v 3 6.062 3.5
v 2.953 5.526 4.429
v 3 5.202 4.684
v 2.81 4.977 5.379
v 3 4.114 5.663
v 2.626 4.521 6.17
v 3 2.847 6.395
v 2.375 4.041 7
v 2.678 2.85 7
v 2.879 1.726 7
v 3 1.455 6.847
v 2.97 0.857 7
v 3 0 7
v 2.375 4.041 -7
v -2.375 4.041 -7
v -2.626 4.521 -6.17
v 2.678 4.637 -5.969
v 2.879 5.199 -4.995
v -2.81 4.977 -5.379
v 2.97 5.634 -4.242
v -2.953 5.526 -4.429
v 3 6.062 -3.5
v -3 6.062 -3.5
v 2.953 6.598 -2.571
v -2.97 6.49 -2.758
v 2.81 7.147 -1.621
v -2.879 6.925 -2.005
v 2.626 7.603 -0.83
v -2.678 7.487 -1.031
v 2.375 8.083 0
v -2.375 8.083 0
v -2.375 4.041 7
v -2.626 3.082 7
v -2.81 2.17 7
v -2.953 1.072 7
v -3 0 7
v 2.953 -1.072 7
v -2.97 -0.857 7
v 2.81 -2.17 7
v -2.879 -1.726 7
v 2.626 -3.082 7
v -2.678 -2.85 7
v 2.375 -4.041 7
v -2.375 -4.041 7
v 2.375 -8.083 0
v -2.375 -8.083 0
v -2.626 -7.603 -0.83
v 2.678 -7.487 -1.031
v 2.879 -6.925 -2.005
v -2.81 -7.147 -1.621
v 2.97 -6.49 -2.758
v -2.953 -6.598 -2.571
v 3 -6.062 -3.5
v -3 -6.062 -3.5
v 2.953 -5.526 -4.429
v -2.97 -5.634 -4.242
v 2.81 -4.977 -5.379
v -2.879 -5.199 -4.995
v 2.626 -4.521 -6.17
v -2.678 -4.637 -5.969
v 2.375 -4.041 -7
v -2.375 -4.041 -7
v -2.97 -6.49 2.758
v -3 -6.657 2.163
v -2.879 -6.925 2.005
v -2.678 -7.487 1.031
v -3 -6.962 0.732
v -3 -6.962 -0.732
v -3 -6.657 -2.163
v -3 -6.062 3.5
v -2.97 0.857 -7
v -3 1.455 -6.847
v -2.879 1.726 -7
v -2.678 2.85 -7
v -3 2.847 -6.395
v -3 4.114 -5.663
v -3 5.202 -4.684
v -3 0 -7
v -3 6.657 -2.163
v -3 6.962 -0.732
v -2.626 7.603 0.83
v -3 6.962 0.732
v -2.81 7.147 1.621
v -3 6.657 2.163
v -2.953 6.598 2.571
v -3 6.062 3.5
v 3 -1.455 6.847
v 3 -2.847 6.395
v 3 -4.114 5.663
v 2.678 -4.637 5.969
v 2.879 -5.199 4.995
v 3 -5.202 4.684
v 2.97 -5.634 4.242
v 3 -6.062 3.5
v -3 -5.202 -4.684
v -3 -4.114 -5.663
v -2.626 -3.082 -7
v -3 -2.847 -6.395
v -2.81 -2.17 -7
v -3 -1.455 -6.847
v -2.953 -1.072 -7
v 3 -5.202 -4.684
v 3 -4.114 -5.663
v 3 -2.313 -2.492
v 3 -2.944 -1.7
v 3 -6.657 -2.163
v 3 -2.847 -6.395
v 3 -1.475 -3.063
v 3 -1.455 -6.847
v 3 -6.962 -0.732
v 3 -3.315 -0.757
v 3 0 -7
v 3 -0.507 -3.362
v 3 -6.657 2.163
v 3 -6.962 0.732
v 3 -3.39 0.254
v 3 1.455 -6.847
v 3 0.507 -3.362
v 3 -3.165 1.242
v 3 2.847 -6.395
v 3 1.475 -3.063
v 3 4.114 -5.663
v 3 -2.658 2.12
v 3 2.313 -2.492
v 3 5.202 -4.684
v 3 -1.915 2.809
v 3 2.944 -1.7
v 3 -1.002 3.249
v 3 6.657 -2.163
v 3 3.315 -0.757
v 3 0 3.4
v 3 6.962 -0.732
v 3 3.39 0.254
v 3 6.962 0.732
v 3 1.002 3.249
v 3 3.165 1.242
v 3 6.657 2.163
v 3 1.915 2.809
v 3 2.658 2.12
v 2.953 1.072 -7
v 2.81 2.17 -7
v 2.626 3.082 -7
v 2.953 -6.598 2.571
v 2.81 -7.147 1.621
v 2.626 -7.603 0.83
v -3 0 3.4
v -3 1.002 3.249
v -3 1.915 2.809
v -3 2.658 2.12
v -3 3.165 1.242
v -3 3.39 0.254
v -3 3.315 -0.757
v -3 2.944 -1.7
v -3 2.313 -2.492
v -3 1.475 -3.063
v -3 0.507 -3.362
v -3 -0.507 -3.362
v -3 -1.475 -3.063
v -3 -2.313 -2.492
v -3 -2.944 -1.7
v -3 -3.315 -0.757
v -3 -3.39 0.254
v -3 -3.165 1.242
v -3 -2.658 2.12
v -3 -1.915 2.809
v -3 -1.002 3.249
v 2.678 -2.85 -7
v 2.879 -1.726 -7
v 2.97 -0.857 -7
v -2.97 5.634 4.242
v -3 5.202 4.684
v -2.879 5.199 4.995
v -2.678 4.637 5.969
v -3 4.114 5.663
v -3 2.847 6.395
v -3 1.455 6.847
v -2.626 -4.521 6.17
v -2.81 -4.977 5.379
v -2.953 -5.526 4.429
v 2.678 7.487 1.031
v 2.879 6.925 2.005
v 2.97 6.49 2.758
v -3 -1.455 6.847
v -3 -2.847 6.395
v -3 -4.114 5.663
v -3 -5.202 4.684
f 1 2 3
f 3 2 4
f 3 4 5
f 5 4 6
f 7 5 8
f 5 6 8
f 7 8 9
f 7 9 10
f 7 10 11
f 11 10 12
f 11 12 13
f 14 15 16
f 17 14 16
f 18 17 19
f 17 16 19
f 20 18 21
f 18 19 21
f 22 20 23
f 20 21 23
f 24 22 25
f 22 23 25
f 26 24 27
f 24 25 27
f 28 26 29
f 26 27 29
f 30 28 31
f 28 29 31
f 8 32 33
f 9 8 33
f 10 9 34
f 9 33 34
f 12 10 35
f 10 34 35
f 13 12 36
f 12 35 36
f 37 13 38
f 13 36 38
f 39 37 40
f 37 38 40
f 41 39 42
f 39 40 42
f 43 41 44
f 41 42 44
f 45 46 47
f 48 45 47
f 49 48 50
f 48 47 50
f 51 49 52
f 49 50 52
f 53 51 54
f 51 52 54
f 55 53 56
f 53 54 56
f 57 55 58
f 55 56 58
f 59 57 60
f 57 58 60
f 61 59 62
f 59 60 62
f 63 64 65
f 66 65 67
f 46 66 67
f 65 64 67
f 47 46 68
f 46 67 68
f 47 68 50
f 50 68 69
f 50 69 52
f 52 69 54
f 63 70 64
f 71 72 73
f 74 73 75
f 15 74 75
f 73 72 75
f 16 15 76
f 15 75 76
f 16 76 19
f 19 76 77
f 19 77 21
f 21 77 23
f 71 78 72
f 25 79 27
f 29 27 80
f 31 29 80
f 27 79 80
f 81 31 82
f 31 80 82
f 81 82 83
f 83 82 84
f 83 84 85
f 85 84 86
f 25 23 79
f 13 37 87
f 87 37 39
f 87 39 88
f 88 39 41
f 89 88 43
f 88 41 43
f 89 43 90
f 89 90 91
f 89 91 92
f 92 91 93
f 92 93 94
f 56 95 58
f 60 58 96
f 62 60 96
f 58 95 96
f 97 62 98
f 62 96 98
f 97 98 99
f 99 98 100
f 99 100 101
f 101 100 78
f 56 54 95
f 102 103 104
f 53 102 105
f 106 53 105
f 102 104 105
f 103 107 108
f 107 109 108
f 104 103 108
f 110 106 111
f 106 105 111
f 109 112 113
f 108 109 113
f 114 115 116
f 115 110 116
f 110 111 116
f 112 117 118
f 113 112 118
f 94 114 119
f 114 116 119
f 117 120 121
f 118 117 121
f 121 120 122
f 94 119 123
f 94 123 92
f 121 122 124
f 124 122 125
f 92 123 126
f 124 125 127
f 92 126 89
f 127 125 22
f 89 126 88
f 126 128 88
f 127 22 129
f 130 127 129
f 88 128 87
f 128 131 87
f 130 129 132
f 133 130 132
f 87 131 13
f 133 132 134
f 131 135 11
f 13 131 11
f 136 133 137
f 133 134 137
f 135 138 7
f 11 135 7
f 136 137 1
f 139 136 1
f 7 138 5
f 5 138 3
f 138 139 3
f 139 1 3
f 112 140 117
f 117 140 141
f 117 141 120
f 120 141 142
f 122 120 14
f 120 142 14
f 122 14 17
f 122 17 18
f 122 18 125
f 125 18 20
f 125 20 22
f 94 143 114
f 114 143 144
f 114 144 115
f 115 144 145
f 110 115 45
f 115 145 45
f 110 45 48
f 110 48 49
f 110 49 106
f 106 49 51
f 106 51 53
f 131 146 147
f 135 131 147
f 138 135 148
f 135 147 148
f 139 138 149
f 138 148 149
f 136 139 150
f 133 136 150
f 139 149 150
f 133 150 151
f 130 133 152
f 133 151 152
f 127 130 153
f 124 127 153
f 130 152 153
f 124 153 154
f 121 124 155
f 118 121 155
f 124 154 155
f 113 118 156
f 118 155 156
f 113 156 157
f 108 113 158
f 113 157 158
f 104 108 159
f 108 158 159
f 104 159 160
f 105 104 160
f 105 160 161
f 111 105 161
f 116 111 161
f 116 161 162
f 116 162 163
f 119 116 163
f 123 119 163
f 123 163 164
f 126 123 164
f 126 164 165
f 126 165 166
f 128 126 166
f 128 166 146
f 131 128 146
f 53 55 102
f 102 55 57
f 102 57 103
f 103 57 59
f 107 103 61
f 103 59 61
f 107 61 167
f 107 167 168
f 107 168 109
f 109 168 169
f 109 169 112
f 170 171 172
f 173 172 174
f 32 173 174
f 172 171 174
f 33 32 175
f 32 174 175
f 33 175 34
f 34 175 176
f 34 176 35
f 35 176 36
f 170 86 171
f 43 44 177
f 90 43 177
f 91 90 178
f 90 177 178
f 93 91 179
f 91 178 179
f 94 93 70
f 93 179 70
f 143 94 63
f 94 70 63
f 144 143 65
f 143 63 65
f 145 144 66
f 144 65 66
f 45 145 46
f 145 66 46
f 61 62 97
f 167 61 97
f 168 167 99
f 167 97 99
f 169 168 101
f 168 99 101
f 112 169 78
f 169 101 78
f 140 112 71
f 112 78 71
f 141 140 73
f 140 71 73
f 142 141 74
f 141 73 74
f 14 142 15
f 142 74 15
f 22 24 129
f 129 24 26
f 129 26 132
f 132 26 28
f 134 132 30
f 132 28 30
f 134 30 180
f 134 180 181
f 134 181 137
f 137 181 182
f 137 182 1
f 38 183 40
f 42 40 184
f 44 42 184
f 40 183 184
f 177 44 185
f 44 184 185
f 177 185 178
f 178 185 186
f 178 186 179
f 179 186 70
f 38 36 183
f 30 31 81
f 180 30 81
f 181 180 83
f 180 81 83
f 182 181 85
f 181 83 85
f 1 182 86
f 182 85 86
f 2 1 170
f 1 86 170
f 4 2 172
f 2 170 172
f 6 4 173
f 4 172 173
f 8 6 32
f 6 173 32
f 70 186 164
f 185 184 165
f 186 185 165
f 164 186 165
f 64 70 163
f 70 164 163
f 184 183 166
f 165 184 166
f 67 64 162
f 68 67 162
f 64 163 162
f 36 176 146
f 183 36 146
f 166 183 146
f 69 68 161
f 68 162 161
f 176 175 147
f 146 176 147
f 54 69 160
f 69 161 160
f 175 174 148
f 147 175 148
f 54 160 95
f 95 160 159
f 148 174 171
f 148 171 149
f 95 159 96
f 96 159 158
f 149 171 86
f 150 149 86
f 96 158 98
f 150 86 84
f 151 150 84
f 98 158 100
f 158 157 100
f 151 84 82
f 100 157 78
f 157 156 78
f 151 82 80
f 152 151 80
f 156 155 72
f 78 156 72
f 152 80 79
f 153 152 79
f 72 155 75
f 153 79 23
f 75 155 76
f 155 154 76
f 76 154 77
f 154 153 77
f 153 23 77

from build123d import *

# Parameters (mm, degrees)
ENL_V_MAT_EXTRU_1_DEPTH = 7
PER_AGE2_D              = 6.8
PER_AGE2_DEPTH          = 22.25
PER_AGE2_TIP            = 2.042926105


with BuildPart() as part:
    # Esquisse1 → Base-Révolution (revolve)
    with BuildSketch(Plane.XY, mode=Mode.PRIVATE) as base_r_volution_sk:
        Polygon((-3, 0), (3, 0), (3, 7), (0, 12.196152423), (-3, 7), align=None)
    revolve(base_r_volution_sk.sketch.rotate(Axis((-10.755568754, 0, 0), (1, 0, 0)), 270), axis=Axis((-10.755568754, 0, 0), (1, 0, 0)))  # turned: the seam where the file's is

    # Esquisse2 → Enlèv. mat.-Extru.1 (cut, through all)
    with BuildSketch(Plane.ZY.offset(3)):
        Polygon((0, 19.629909152), (17, 9.814954576), (17, -9.814954576), (0, -19.629909152), (-17, -9.814954576), (-17, 9.814954576), align=None)
        Polygon((0, 8.082903769), (7, 4.041451884), (7, -4.041451884), (0, -8.082903769), (-7, -4.041451884), (-7, 4.041451884), align=None, mode=Mode.SUBTRACT)
    extrude(amount=-ENL_V_MAT_EXTRU_1_DEPTH, mode=Mode.SUBTRACT)

    # Perçage2
    with Locations(Plane(origin=(3, 0, 0), x_dir=(0, 0, -1), z_dir=(1, 0, 0))):
        with Locations((0, 0)):
            Hole(PER_AGE2_D / 2, depth=PER_AGE2_DEPTH)
            with Locations((0, 0, -(PER_AGE2_DEPTH + PER_AGE2_TIP / 2))):  # 118° drill point
                Cone(0, PER_AGE2_D / 2, PER_AGE2_TIP, mode=Mode.SUBTRACT)


solid = part.part
